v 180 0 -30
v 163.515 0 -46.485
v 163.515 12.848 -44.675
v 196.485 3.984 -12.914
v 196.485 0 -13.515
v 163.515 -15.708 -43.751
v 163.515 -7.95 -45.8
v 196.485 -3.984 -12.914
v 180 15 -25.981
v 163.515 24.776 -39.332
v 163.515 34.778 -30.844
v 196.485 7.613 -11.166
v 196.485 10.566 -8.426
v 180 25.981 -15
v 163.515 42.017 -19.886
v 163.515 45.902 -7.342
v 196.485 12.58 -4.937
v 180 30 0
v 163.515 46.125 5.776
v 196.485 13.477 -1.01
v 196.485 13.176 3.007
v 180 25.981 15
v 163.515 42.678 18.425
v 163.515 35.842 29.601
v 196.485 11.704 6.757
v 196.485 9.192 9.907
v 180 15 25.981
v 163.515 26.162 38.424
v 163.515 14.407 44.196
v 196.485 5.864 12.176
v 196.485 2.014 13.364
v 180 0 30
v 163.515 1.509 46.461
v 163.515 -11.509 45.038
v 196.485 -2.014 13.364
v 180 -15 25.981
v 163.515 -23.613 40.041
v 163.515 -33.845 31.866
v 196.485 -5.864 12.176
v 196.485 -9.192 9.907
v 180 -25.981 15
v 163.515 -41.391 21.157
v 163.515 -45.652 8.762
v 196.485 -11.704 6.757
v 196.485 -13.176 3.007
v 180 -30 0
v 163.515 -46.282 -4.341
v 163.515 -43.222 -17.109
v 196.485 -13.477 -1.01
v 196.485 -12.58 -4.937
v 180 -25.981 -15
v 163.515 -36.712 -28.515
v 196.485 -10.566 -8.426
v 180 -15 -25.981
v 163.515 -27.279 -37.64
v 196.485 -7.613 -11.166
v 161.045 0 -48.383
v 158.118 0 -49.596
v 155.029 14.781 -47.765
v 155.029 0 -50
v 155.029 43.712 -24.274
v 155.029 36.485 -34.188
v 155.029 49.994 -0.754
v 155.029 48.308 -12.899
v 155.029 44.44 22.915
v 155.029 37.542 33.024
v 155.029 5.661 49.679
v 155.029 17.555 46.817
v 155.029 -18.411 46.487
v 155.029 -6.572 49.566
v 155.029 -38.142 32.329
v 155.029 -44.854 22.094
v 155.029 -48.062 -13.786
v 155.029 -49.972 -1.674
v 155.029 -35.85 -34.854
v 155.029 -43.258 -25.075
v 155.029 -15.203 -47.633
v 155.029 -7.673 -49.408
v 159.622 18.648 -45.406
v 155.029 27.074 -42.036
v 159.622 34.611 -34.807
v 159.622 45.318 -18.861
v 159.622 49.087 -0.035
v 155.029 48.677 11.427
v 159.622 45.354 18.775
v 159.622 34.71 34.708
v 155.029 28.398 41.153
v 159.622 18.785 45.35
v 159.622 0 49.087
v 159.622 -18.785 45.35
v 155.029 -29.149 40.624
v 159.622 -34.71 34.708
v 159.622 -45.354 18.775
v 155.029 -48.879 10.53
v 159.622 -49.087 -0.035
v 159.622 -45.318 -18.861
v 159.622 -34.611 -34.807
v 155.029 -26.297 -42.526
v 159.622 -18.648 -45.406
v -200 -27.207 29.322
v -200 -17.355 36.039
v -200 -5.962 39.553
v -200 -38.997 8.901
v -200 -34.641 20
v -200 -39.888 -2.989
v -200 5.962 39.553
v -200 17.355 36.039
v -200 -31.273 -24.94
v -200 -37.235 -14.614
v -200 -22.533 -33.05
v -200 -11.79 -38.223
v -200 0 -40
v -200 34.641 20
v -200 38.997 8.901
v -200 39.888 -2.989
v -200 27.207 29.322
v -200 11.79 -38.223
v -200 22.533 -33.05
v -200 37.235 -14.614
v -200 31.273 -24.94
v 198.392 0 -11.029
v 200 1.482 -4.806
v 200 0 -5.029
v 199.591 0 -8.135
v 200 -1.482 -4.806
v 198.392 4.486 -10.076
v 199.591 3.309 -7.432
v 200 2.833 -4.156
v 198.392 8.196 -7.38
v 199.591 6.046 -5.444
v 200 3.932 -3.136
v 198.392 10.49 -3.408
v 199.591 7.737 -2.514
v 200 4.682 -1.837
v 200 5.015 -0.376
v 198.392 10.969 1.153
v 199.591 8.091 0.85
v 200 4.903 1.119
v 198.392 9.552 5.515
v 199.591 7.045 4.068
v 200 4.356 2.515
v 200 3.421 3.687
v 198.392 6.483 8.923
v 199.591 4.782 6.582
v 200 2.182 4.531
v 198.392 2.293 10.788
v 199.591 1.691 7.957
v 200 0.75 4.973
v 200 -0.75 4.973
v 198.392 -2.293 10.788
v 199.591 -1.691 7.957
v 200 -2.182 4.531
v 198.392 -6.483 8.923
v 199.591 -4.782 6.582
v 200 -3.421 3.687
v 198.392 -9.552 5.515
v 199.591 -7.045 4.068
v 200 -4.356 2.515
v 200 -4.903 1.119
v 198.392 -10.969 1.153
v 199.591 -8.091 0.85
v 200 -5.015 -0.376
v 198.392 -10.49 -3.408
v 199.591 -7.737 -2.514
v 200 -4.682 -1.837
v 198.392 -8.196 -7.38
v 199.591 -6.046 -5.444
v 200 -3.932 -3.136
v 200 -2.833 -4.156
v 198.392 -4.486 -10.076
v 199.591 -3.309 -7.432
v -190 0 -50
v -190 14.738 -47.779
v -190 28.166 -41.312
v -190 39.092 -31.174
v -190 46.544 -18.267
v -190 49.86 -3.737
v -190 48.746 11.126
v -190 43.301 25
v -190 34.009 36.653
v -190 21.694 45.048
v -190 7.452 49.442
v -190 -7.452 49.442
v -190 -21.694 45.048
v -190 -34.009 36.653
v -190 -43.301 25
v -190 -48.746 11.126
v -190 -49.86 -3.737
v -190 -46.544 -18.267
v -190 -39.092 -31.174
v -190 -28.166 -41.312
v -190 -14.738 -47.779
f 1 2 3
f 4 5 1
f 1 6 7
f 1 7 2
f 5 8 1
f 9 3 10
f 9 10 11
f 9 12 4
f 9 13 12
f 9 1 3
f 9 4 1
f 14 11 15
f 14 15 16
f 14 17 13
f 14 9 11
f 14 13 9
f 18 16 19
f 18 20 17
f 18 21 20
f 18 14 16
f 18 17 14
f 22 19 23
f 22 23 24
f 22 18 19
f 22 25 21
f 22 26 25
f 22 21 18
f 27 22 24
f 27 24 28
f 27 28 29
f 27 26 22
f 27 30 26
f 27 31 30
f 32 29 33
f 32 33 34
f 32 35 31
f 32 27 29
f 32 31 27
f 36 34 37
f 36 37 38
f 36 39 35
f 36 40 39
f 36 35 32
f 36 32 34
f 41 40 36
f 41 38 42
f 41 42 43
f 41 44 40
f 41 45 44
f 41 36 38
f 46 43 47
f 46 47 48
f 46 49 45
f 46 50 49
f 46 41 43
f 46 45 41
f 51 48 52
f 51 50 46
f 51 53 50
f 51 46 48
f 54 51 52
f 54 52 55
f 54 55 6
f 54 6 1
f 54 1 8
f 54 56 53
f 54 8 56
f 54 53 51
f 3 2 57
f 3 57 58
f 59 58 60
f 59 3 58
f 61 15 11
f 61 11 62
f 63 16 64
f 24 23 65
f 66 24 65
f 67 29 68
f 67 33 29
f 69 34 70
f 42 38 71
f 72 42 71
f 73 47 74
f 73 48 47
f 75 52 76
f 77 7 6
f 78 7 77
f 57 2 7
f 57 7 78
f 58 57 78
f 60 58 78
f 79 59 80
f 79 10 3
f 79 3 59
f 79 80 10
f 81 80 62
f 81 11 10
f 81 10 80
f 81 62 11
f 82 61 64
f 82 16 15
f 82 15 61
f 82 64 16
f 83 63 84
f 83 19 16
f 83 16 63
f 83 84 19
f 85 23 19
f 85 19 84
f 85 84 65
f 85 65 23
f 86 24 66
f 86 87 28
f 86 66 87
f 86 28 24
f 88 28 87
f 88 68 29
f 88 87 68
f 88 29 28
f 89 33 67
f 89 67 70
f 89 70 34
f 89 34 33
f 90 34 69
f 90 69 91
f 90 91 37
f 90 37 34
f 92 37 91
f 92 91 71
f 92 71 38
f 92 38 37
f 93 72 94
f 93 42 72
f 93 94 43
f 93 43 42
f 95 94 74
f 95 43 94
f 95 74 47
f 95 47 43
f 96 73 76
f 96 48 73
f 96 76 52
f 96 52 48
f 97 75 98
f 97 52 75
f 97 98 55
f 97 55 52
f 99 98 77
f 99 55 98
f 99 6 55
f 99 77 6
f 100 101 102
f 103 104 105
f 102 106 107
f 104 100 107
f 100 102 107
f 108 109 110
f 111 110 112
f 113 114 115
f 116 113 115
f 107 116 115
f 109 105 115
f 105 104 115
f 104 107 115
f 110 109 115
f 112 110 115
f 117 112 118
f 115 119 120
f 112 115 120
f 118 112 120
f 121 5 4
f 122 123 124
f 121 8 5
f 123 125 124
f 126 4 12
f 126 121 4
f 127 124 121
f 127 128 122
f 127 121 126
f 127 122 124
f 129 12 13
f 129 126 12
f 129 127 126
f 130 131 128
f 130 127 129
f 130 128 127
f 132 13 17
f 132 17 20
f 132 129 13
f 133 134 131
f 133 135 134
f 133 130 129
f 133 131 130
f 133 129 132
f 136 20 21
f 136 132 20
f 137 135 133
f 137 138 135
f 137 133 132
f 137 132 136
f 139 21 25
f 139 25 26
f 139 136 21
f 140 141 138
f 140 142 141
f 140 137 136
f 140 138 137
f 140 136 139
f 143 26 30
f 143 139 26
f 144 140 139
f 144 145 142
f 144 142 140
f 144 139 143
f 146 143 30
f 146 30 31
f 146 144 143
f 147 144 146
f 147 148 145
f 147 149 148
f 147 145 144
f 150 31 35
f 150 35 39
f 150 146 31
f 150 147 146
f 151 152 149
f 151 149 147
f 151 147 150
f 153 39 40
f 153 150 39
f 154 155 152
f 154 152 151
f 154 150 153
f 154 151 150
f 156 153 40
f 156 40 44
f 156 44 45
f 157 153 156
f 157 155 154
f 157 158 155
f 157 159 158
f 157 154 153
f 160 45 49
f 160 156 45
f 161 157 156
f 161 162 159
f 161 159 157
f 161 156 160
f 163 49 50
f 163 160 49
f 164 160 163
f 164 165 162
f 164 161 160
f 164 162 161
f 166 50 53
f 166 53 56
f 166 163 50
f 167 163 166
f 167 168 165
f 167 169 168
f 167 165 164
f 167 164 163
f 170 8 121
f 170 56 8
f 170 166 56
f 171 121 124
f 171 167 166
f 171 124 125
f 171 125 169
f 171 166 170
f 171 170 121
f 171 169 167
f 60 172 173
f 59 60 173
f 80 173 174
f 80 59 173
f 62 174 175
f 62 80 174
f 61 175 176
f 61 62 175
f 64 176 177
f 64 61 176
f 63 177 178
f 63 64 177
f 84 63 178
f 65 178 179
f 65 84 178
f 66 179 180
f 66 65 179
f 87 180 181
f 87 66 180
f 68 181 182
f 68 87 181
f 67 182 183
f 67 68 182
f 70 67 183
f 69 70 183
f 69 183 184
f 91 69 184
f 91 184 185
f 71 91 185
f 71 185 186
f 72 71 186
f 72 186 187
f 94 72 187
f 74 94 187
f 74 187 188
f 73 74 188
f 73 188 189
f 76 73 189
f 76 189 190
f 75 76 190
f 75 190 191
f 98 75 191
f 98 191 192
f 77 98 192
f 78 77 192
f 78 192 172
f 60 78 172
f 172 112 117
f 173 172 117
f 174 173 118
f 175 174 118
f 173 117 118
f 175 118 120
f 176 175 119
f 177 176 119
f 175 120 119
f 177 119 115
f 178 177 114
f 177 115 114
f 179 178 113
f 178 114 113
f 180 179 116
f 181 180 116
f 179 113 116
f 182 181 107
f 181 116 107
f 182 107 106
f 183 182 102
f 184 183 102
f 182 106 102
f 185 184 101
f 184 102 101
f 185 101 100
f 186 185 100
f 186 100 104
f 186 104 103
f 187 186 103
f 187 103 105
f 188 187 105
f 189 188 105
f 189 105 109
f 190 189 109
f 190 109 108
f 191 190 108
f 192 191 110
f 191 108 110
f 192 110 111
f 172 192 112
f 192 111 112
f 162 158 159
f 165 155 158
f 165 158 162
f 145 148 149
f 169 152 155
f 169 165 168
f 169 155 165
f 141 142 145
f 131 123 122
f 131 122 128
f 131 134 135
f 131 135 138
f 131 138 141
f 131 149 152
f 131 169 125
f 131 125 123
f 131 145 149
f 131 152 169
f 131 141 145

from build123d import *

# Parameters (mm, degrees)
SKETCH1_R           = 50
BOSS_EXTRUDE1_DEPTH = 200
CHAMFER1_SIZE       = 40
FILLET1_R           = 12
FILLET2_R           = 12
CHAMFER2_SIZE       = 10


with BuildPart() as part:
    # Sketch1 → Boss-Extrude1 (new body, symmetric)
    with BuildSketch(Plane(origin=(0, 0, 0), x_dir=(0, 0, -1), z_dir=(1, 0, 0))):
        Circle(SKETCH1_R)
    extrude(amount=BOSS_EXTRUDE1_DEPTH, both=True)

    # Chamfer1
    chamfer1_edges = [part.edges().sort_by_distance(p)[0] for p in [
        (200, 0, 50),
    ]]
    chamfer(chamfer1_edges, length=CHAMFER1_SIZE)

    # Fillet1
    fillet1_edges = [part.edges().sort_by_distance(p)[0] for p in [
        (200, 0, 10),
    ]]
    fillet(fillet1_edges, radius=FILLET1_R)

    # Fillet2
    fillet2_edges = [part.edges().sort_by_distance(p)[0] for p in [
        (160, 0, 50),
    ]]
    fillet(fillet2_edges, radius=FILLET2_R)

    # Chamfer2
    chamfer2_edges = [part.edges().sort_by_distance(p)[0] for p in [
        (-200, 0, 50),
    ]]
    chamfer(chamfer2_edges, length=CHAMFER2_SIZE)


solid = part.part
